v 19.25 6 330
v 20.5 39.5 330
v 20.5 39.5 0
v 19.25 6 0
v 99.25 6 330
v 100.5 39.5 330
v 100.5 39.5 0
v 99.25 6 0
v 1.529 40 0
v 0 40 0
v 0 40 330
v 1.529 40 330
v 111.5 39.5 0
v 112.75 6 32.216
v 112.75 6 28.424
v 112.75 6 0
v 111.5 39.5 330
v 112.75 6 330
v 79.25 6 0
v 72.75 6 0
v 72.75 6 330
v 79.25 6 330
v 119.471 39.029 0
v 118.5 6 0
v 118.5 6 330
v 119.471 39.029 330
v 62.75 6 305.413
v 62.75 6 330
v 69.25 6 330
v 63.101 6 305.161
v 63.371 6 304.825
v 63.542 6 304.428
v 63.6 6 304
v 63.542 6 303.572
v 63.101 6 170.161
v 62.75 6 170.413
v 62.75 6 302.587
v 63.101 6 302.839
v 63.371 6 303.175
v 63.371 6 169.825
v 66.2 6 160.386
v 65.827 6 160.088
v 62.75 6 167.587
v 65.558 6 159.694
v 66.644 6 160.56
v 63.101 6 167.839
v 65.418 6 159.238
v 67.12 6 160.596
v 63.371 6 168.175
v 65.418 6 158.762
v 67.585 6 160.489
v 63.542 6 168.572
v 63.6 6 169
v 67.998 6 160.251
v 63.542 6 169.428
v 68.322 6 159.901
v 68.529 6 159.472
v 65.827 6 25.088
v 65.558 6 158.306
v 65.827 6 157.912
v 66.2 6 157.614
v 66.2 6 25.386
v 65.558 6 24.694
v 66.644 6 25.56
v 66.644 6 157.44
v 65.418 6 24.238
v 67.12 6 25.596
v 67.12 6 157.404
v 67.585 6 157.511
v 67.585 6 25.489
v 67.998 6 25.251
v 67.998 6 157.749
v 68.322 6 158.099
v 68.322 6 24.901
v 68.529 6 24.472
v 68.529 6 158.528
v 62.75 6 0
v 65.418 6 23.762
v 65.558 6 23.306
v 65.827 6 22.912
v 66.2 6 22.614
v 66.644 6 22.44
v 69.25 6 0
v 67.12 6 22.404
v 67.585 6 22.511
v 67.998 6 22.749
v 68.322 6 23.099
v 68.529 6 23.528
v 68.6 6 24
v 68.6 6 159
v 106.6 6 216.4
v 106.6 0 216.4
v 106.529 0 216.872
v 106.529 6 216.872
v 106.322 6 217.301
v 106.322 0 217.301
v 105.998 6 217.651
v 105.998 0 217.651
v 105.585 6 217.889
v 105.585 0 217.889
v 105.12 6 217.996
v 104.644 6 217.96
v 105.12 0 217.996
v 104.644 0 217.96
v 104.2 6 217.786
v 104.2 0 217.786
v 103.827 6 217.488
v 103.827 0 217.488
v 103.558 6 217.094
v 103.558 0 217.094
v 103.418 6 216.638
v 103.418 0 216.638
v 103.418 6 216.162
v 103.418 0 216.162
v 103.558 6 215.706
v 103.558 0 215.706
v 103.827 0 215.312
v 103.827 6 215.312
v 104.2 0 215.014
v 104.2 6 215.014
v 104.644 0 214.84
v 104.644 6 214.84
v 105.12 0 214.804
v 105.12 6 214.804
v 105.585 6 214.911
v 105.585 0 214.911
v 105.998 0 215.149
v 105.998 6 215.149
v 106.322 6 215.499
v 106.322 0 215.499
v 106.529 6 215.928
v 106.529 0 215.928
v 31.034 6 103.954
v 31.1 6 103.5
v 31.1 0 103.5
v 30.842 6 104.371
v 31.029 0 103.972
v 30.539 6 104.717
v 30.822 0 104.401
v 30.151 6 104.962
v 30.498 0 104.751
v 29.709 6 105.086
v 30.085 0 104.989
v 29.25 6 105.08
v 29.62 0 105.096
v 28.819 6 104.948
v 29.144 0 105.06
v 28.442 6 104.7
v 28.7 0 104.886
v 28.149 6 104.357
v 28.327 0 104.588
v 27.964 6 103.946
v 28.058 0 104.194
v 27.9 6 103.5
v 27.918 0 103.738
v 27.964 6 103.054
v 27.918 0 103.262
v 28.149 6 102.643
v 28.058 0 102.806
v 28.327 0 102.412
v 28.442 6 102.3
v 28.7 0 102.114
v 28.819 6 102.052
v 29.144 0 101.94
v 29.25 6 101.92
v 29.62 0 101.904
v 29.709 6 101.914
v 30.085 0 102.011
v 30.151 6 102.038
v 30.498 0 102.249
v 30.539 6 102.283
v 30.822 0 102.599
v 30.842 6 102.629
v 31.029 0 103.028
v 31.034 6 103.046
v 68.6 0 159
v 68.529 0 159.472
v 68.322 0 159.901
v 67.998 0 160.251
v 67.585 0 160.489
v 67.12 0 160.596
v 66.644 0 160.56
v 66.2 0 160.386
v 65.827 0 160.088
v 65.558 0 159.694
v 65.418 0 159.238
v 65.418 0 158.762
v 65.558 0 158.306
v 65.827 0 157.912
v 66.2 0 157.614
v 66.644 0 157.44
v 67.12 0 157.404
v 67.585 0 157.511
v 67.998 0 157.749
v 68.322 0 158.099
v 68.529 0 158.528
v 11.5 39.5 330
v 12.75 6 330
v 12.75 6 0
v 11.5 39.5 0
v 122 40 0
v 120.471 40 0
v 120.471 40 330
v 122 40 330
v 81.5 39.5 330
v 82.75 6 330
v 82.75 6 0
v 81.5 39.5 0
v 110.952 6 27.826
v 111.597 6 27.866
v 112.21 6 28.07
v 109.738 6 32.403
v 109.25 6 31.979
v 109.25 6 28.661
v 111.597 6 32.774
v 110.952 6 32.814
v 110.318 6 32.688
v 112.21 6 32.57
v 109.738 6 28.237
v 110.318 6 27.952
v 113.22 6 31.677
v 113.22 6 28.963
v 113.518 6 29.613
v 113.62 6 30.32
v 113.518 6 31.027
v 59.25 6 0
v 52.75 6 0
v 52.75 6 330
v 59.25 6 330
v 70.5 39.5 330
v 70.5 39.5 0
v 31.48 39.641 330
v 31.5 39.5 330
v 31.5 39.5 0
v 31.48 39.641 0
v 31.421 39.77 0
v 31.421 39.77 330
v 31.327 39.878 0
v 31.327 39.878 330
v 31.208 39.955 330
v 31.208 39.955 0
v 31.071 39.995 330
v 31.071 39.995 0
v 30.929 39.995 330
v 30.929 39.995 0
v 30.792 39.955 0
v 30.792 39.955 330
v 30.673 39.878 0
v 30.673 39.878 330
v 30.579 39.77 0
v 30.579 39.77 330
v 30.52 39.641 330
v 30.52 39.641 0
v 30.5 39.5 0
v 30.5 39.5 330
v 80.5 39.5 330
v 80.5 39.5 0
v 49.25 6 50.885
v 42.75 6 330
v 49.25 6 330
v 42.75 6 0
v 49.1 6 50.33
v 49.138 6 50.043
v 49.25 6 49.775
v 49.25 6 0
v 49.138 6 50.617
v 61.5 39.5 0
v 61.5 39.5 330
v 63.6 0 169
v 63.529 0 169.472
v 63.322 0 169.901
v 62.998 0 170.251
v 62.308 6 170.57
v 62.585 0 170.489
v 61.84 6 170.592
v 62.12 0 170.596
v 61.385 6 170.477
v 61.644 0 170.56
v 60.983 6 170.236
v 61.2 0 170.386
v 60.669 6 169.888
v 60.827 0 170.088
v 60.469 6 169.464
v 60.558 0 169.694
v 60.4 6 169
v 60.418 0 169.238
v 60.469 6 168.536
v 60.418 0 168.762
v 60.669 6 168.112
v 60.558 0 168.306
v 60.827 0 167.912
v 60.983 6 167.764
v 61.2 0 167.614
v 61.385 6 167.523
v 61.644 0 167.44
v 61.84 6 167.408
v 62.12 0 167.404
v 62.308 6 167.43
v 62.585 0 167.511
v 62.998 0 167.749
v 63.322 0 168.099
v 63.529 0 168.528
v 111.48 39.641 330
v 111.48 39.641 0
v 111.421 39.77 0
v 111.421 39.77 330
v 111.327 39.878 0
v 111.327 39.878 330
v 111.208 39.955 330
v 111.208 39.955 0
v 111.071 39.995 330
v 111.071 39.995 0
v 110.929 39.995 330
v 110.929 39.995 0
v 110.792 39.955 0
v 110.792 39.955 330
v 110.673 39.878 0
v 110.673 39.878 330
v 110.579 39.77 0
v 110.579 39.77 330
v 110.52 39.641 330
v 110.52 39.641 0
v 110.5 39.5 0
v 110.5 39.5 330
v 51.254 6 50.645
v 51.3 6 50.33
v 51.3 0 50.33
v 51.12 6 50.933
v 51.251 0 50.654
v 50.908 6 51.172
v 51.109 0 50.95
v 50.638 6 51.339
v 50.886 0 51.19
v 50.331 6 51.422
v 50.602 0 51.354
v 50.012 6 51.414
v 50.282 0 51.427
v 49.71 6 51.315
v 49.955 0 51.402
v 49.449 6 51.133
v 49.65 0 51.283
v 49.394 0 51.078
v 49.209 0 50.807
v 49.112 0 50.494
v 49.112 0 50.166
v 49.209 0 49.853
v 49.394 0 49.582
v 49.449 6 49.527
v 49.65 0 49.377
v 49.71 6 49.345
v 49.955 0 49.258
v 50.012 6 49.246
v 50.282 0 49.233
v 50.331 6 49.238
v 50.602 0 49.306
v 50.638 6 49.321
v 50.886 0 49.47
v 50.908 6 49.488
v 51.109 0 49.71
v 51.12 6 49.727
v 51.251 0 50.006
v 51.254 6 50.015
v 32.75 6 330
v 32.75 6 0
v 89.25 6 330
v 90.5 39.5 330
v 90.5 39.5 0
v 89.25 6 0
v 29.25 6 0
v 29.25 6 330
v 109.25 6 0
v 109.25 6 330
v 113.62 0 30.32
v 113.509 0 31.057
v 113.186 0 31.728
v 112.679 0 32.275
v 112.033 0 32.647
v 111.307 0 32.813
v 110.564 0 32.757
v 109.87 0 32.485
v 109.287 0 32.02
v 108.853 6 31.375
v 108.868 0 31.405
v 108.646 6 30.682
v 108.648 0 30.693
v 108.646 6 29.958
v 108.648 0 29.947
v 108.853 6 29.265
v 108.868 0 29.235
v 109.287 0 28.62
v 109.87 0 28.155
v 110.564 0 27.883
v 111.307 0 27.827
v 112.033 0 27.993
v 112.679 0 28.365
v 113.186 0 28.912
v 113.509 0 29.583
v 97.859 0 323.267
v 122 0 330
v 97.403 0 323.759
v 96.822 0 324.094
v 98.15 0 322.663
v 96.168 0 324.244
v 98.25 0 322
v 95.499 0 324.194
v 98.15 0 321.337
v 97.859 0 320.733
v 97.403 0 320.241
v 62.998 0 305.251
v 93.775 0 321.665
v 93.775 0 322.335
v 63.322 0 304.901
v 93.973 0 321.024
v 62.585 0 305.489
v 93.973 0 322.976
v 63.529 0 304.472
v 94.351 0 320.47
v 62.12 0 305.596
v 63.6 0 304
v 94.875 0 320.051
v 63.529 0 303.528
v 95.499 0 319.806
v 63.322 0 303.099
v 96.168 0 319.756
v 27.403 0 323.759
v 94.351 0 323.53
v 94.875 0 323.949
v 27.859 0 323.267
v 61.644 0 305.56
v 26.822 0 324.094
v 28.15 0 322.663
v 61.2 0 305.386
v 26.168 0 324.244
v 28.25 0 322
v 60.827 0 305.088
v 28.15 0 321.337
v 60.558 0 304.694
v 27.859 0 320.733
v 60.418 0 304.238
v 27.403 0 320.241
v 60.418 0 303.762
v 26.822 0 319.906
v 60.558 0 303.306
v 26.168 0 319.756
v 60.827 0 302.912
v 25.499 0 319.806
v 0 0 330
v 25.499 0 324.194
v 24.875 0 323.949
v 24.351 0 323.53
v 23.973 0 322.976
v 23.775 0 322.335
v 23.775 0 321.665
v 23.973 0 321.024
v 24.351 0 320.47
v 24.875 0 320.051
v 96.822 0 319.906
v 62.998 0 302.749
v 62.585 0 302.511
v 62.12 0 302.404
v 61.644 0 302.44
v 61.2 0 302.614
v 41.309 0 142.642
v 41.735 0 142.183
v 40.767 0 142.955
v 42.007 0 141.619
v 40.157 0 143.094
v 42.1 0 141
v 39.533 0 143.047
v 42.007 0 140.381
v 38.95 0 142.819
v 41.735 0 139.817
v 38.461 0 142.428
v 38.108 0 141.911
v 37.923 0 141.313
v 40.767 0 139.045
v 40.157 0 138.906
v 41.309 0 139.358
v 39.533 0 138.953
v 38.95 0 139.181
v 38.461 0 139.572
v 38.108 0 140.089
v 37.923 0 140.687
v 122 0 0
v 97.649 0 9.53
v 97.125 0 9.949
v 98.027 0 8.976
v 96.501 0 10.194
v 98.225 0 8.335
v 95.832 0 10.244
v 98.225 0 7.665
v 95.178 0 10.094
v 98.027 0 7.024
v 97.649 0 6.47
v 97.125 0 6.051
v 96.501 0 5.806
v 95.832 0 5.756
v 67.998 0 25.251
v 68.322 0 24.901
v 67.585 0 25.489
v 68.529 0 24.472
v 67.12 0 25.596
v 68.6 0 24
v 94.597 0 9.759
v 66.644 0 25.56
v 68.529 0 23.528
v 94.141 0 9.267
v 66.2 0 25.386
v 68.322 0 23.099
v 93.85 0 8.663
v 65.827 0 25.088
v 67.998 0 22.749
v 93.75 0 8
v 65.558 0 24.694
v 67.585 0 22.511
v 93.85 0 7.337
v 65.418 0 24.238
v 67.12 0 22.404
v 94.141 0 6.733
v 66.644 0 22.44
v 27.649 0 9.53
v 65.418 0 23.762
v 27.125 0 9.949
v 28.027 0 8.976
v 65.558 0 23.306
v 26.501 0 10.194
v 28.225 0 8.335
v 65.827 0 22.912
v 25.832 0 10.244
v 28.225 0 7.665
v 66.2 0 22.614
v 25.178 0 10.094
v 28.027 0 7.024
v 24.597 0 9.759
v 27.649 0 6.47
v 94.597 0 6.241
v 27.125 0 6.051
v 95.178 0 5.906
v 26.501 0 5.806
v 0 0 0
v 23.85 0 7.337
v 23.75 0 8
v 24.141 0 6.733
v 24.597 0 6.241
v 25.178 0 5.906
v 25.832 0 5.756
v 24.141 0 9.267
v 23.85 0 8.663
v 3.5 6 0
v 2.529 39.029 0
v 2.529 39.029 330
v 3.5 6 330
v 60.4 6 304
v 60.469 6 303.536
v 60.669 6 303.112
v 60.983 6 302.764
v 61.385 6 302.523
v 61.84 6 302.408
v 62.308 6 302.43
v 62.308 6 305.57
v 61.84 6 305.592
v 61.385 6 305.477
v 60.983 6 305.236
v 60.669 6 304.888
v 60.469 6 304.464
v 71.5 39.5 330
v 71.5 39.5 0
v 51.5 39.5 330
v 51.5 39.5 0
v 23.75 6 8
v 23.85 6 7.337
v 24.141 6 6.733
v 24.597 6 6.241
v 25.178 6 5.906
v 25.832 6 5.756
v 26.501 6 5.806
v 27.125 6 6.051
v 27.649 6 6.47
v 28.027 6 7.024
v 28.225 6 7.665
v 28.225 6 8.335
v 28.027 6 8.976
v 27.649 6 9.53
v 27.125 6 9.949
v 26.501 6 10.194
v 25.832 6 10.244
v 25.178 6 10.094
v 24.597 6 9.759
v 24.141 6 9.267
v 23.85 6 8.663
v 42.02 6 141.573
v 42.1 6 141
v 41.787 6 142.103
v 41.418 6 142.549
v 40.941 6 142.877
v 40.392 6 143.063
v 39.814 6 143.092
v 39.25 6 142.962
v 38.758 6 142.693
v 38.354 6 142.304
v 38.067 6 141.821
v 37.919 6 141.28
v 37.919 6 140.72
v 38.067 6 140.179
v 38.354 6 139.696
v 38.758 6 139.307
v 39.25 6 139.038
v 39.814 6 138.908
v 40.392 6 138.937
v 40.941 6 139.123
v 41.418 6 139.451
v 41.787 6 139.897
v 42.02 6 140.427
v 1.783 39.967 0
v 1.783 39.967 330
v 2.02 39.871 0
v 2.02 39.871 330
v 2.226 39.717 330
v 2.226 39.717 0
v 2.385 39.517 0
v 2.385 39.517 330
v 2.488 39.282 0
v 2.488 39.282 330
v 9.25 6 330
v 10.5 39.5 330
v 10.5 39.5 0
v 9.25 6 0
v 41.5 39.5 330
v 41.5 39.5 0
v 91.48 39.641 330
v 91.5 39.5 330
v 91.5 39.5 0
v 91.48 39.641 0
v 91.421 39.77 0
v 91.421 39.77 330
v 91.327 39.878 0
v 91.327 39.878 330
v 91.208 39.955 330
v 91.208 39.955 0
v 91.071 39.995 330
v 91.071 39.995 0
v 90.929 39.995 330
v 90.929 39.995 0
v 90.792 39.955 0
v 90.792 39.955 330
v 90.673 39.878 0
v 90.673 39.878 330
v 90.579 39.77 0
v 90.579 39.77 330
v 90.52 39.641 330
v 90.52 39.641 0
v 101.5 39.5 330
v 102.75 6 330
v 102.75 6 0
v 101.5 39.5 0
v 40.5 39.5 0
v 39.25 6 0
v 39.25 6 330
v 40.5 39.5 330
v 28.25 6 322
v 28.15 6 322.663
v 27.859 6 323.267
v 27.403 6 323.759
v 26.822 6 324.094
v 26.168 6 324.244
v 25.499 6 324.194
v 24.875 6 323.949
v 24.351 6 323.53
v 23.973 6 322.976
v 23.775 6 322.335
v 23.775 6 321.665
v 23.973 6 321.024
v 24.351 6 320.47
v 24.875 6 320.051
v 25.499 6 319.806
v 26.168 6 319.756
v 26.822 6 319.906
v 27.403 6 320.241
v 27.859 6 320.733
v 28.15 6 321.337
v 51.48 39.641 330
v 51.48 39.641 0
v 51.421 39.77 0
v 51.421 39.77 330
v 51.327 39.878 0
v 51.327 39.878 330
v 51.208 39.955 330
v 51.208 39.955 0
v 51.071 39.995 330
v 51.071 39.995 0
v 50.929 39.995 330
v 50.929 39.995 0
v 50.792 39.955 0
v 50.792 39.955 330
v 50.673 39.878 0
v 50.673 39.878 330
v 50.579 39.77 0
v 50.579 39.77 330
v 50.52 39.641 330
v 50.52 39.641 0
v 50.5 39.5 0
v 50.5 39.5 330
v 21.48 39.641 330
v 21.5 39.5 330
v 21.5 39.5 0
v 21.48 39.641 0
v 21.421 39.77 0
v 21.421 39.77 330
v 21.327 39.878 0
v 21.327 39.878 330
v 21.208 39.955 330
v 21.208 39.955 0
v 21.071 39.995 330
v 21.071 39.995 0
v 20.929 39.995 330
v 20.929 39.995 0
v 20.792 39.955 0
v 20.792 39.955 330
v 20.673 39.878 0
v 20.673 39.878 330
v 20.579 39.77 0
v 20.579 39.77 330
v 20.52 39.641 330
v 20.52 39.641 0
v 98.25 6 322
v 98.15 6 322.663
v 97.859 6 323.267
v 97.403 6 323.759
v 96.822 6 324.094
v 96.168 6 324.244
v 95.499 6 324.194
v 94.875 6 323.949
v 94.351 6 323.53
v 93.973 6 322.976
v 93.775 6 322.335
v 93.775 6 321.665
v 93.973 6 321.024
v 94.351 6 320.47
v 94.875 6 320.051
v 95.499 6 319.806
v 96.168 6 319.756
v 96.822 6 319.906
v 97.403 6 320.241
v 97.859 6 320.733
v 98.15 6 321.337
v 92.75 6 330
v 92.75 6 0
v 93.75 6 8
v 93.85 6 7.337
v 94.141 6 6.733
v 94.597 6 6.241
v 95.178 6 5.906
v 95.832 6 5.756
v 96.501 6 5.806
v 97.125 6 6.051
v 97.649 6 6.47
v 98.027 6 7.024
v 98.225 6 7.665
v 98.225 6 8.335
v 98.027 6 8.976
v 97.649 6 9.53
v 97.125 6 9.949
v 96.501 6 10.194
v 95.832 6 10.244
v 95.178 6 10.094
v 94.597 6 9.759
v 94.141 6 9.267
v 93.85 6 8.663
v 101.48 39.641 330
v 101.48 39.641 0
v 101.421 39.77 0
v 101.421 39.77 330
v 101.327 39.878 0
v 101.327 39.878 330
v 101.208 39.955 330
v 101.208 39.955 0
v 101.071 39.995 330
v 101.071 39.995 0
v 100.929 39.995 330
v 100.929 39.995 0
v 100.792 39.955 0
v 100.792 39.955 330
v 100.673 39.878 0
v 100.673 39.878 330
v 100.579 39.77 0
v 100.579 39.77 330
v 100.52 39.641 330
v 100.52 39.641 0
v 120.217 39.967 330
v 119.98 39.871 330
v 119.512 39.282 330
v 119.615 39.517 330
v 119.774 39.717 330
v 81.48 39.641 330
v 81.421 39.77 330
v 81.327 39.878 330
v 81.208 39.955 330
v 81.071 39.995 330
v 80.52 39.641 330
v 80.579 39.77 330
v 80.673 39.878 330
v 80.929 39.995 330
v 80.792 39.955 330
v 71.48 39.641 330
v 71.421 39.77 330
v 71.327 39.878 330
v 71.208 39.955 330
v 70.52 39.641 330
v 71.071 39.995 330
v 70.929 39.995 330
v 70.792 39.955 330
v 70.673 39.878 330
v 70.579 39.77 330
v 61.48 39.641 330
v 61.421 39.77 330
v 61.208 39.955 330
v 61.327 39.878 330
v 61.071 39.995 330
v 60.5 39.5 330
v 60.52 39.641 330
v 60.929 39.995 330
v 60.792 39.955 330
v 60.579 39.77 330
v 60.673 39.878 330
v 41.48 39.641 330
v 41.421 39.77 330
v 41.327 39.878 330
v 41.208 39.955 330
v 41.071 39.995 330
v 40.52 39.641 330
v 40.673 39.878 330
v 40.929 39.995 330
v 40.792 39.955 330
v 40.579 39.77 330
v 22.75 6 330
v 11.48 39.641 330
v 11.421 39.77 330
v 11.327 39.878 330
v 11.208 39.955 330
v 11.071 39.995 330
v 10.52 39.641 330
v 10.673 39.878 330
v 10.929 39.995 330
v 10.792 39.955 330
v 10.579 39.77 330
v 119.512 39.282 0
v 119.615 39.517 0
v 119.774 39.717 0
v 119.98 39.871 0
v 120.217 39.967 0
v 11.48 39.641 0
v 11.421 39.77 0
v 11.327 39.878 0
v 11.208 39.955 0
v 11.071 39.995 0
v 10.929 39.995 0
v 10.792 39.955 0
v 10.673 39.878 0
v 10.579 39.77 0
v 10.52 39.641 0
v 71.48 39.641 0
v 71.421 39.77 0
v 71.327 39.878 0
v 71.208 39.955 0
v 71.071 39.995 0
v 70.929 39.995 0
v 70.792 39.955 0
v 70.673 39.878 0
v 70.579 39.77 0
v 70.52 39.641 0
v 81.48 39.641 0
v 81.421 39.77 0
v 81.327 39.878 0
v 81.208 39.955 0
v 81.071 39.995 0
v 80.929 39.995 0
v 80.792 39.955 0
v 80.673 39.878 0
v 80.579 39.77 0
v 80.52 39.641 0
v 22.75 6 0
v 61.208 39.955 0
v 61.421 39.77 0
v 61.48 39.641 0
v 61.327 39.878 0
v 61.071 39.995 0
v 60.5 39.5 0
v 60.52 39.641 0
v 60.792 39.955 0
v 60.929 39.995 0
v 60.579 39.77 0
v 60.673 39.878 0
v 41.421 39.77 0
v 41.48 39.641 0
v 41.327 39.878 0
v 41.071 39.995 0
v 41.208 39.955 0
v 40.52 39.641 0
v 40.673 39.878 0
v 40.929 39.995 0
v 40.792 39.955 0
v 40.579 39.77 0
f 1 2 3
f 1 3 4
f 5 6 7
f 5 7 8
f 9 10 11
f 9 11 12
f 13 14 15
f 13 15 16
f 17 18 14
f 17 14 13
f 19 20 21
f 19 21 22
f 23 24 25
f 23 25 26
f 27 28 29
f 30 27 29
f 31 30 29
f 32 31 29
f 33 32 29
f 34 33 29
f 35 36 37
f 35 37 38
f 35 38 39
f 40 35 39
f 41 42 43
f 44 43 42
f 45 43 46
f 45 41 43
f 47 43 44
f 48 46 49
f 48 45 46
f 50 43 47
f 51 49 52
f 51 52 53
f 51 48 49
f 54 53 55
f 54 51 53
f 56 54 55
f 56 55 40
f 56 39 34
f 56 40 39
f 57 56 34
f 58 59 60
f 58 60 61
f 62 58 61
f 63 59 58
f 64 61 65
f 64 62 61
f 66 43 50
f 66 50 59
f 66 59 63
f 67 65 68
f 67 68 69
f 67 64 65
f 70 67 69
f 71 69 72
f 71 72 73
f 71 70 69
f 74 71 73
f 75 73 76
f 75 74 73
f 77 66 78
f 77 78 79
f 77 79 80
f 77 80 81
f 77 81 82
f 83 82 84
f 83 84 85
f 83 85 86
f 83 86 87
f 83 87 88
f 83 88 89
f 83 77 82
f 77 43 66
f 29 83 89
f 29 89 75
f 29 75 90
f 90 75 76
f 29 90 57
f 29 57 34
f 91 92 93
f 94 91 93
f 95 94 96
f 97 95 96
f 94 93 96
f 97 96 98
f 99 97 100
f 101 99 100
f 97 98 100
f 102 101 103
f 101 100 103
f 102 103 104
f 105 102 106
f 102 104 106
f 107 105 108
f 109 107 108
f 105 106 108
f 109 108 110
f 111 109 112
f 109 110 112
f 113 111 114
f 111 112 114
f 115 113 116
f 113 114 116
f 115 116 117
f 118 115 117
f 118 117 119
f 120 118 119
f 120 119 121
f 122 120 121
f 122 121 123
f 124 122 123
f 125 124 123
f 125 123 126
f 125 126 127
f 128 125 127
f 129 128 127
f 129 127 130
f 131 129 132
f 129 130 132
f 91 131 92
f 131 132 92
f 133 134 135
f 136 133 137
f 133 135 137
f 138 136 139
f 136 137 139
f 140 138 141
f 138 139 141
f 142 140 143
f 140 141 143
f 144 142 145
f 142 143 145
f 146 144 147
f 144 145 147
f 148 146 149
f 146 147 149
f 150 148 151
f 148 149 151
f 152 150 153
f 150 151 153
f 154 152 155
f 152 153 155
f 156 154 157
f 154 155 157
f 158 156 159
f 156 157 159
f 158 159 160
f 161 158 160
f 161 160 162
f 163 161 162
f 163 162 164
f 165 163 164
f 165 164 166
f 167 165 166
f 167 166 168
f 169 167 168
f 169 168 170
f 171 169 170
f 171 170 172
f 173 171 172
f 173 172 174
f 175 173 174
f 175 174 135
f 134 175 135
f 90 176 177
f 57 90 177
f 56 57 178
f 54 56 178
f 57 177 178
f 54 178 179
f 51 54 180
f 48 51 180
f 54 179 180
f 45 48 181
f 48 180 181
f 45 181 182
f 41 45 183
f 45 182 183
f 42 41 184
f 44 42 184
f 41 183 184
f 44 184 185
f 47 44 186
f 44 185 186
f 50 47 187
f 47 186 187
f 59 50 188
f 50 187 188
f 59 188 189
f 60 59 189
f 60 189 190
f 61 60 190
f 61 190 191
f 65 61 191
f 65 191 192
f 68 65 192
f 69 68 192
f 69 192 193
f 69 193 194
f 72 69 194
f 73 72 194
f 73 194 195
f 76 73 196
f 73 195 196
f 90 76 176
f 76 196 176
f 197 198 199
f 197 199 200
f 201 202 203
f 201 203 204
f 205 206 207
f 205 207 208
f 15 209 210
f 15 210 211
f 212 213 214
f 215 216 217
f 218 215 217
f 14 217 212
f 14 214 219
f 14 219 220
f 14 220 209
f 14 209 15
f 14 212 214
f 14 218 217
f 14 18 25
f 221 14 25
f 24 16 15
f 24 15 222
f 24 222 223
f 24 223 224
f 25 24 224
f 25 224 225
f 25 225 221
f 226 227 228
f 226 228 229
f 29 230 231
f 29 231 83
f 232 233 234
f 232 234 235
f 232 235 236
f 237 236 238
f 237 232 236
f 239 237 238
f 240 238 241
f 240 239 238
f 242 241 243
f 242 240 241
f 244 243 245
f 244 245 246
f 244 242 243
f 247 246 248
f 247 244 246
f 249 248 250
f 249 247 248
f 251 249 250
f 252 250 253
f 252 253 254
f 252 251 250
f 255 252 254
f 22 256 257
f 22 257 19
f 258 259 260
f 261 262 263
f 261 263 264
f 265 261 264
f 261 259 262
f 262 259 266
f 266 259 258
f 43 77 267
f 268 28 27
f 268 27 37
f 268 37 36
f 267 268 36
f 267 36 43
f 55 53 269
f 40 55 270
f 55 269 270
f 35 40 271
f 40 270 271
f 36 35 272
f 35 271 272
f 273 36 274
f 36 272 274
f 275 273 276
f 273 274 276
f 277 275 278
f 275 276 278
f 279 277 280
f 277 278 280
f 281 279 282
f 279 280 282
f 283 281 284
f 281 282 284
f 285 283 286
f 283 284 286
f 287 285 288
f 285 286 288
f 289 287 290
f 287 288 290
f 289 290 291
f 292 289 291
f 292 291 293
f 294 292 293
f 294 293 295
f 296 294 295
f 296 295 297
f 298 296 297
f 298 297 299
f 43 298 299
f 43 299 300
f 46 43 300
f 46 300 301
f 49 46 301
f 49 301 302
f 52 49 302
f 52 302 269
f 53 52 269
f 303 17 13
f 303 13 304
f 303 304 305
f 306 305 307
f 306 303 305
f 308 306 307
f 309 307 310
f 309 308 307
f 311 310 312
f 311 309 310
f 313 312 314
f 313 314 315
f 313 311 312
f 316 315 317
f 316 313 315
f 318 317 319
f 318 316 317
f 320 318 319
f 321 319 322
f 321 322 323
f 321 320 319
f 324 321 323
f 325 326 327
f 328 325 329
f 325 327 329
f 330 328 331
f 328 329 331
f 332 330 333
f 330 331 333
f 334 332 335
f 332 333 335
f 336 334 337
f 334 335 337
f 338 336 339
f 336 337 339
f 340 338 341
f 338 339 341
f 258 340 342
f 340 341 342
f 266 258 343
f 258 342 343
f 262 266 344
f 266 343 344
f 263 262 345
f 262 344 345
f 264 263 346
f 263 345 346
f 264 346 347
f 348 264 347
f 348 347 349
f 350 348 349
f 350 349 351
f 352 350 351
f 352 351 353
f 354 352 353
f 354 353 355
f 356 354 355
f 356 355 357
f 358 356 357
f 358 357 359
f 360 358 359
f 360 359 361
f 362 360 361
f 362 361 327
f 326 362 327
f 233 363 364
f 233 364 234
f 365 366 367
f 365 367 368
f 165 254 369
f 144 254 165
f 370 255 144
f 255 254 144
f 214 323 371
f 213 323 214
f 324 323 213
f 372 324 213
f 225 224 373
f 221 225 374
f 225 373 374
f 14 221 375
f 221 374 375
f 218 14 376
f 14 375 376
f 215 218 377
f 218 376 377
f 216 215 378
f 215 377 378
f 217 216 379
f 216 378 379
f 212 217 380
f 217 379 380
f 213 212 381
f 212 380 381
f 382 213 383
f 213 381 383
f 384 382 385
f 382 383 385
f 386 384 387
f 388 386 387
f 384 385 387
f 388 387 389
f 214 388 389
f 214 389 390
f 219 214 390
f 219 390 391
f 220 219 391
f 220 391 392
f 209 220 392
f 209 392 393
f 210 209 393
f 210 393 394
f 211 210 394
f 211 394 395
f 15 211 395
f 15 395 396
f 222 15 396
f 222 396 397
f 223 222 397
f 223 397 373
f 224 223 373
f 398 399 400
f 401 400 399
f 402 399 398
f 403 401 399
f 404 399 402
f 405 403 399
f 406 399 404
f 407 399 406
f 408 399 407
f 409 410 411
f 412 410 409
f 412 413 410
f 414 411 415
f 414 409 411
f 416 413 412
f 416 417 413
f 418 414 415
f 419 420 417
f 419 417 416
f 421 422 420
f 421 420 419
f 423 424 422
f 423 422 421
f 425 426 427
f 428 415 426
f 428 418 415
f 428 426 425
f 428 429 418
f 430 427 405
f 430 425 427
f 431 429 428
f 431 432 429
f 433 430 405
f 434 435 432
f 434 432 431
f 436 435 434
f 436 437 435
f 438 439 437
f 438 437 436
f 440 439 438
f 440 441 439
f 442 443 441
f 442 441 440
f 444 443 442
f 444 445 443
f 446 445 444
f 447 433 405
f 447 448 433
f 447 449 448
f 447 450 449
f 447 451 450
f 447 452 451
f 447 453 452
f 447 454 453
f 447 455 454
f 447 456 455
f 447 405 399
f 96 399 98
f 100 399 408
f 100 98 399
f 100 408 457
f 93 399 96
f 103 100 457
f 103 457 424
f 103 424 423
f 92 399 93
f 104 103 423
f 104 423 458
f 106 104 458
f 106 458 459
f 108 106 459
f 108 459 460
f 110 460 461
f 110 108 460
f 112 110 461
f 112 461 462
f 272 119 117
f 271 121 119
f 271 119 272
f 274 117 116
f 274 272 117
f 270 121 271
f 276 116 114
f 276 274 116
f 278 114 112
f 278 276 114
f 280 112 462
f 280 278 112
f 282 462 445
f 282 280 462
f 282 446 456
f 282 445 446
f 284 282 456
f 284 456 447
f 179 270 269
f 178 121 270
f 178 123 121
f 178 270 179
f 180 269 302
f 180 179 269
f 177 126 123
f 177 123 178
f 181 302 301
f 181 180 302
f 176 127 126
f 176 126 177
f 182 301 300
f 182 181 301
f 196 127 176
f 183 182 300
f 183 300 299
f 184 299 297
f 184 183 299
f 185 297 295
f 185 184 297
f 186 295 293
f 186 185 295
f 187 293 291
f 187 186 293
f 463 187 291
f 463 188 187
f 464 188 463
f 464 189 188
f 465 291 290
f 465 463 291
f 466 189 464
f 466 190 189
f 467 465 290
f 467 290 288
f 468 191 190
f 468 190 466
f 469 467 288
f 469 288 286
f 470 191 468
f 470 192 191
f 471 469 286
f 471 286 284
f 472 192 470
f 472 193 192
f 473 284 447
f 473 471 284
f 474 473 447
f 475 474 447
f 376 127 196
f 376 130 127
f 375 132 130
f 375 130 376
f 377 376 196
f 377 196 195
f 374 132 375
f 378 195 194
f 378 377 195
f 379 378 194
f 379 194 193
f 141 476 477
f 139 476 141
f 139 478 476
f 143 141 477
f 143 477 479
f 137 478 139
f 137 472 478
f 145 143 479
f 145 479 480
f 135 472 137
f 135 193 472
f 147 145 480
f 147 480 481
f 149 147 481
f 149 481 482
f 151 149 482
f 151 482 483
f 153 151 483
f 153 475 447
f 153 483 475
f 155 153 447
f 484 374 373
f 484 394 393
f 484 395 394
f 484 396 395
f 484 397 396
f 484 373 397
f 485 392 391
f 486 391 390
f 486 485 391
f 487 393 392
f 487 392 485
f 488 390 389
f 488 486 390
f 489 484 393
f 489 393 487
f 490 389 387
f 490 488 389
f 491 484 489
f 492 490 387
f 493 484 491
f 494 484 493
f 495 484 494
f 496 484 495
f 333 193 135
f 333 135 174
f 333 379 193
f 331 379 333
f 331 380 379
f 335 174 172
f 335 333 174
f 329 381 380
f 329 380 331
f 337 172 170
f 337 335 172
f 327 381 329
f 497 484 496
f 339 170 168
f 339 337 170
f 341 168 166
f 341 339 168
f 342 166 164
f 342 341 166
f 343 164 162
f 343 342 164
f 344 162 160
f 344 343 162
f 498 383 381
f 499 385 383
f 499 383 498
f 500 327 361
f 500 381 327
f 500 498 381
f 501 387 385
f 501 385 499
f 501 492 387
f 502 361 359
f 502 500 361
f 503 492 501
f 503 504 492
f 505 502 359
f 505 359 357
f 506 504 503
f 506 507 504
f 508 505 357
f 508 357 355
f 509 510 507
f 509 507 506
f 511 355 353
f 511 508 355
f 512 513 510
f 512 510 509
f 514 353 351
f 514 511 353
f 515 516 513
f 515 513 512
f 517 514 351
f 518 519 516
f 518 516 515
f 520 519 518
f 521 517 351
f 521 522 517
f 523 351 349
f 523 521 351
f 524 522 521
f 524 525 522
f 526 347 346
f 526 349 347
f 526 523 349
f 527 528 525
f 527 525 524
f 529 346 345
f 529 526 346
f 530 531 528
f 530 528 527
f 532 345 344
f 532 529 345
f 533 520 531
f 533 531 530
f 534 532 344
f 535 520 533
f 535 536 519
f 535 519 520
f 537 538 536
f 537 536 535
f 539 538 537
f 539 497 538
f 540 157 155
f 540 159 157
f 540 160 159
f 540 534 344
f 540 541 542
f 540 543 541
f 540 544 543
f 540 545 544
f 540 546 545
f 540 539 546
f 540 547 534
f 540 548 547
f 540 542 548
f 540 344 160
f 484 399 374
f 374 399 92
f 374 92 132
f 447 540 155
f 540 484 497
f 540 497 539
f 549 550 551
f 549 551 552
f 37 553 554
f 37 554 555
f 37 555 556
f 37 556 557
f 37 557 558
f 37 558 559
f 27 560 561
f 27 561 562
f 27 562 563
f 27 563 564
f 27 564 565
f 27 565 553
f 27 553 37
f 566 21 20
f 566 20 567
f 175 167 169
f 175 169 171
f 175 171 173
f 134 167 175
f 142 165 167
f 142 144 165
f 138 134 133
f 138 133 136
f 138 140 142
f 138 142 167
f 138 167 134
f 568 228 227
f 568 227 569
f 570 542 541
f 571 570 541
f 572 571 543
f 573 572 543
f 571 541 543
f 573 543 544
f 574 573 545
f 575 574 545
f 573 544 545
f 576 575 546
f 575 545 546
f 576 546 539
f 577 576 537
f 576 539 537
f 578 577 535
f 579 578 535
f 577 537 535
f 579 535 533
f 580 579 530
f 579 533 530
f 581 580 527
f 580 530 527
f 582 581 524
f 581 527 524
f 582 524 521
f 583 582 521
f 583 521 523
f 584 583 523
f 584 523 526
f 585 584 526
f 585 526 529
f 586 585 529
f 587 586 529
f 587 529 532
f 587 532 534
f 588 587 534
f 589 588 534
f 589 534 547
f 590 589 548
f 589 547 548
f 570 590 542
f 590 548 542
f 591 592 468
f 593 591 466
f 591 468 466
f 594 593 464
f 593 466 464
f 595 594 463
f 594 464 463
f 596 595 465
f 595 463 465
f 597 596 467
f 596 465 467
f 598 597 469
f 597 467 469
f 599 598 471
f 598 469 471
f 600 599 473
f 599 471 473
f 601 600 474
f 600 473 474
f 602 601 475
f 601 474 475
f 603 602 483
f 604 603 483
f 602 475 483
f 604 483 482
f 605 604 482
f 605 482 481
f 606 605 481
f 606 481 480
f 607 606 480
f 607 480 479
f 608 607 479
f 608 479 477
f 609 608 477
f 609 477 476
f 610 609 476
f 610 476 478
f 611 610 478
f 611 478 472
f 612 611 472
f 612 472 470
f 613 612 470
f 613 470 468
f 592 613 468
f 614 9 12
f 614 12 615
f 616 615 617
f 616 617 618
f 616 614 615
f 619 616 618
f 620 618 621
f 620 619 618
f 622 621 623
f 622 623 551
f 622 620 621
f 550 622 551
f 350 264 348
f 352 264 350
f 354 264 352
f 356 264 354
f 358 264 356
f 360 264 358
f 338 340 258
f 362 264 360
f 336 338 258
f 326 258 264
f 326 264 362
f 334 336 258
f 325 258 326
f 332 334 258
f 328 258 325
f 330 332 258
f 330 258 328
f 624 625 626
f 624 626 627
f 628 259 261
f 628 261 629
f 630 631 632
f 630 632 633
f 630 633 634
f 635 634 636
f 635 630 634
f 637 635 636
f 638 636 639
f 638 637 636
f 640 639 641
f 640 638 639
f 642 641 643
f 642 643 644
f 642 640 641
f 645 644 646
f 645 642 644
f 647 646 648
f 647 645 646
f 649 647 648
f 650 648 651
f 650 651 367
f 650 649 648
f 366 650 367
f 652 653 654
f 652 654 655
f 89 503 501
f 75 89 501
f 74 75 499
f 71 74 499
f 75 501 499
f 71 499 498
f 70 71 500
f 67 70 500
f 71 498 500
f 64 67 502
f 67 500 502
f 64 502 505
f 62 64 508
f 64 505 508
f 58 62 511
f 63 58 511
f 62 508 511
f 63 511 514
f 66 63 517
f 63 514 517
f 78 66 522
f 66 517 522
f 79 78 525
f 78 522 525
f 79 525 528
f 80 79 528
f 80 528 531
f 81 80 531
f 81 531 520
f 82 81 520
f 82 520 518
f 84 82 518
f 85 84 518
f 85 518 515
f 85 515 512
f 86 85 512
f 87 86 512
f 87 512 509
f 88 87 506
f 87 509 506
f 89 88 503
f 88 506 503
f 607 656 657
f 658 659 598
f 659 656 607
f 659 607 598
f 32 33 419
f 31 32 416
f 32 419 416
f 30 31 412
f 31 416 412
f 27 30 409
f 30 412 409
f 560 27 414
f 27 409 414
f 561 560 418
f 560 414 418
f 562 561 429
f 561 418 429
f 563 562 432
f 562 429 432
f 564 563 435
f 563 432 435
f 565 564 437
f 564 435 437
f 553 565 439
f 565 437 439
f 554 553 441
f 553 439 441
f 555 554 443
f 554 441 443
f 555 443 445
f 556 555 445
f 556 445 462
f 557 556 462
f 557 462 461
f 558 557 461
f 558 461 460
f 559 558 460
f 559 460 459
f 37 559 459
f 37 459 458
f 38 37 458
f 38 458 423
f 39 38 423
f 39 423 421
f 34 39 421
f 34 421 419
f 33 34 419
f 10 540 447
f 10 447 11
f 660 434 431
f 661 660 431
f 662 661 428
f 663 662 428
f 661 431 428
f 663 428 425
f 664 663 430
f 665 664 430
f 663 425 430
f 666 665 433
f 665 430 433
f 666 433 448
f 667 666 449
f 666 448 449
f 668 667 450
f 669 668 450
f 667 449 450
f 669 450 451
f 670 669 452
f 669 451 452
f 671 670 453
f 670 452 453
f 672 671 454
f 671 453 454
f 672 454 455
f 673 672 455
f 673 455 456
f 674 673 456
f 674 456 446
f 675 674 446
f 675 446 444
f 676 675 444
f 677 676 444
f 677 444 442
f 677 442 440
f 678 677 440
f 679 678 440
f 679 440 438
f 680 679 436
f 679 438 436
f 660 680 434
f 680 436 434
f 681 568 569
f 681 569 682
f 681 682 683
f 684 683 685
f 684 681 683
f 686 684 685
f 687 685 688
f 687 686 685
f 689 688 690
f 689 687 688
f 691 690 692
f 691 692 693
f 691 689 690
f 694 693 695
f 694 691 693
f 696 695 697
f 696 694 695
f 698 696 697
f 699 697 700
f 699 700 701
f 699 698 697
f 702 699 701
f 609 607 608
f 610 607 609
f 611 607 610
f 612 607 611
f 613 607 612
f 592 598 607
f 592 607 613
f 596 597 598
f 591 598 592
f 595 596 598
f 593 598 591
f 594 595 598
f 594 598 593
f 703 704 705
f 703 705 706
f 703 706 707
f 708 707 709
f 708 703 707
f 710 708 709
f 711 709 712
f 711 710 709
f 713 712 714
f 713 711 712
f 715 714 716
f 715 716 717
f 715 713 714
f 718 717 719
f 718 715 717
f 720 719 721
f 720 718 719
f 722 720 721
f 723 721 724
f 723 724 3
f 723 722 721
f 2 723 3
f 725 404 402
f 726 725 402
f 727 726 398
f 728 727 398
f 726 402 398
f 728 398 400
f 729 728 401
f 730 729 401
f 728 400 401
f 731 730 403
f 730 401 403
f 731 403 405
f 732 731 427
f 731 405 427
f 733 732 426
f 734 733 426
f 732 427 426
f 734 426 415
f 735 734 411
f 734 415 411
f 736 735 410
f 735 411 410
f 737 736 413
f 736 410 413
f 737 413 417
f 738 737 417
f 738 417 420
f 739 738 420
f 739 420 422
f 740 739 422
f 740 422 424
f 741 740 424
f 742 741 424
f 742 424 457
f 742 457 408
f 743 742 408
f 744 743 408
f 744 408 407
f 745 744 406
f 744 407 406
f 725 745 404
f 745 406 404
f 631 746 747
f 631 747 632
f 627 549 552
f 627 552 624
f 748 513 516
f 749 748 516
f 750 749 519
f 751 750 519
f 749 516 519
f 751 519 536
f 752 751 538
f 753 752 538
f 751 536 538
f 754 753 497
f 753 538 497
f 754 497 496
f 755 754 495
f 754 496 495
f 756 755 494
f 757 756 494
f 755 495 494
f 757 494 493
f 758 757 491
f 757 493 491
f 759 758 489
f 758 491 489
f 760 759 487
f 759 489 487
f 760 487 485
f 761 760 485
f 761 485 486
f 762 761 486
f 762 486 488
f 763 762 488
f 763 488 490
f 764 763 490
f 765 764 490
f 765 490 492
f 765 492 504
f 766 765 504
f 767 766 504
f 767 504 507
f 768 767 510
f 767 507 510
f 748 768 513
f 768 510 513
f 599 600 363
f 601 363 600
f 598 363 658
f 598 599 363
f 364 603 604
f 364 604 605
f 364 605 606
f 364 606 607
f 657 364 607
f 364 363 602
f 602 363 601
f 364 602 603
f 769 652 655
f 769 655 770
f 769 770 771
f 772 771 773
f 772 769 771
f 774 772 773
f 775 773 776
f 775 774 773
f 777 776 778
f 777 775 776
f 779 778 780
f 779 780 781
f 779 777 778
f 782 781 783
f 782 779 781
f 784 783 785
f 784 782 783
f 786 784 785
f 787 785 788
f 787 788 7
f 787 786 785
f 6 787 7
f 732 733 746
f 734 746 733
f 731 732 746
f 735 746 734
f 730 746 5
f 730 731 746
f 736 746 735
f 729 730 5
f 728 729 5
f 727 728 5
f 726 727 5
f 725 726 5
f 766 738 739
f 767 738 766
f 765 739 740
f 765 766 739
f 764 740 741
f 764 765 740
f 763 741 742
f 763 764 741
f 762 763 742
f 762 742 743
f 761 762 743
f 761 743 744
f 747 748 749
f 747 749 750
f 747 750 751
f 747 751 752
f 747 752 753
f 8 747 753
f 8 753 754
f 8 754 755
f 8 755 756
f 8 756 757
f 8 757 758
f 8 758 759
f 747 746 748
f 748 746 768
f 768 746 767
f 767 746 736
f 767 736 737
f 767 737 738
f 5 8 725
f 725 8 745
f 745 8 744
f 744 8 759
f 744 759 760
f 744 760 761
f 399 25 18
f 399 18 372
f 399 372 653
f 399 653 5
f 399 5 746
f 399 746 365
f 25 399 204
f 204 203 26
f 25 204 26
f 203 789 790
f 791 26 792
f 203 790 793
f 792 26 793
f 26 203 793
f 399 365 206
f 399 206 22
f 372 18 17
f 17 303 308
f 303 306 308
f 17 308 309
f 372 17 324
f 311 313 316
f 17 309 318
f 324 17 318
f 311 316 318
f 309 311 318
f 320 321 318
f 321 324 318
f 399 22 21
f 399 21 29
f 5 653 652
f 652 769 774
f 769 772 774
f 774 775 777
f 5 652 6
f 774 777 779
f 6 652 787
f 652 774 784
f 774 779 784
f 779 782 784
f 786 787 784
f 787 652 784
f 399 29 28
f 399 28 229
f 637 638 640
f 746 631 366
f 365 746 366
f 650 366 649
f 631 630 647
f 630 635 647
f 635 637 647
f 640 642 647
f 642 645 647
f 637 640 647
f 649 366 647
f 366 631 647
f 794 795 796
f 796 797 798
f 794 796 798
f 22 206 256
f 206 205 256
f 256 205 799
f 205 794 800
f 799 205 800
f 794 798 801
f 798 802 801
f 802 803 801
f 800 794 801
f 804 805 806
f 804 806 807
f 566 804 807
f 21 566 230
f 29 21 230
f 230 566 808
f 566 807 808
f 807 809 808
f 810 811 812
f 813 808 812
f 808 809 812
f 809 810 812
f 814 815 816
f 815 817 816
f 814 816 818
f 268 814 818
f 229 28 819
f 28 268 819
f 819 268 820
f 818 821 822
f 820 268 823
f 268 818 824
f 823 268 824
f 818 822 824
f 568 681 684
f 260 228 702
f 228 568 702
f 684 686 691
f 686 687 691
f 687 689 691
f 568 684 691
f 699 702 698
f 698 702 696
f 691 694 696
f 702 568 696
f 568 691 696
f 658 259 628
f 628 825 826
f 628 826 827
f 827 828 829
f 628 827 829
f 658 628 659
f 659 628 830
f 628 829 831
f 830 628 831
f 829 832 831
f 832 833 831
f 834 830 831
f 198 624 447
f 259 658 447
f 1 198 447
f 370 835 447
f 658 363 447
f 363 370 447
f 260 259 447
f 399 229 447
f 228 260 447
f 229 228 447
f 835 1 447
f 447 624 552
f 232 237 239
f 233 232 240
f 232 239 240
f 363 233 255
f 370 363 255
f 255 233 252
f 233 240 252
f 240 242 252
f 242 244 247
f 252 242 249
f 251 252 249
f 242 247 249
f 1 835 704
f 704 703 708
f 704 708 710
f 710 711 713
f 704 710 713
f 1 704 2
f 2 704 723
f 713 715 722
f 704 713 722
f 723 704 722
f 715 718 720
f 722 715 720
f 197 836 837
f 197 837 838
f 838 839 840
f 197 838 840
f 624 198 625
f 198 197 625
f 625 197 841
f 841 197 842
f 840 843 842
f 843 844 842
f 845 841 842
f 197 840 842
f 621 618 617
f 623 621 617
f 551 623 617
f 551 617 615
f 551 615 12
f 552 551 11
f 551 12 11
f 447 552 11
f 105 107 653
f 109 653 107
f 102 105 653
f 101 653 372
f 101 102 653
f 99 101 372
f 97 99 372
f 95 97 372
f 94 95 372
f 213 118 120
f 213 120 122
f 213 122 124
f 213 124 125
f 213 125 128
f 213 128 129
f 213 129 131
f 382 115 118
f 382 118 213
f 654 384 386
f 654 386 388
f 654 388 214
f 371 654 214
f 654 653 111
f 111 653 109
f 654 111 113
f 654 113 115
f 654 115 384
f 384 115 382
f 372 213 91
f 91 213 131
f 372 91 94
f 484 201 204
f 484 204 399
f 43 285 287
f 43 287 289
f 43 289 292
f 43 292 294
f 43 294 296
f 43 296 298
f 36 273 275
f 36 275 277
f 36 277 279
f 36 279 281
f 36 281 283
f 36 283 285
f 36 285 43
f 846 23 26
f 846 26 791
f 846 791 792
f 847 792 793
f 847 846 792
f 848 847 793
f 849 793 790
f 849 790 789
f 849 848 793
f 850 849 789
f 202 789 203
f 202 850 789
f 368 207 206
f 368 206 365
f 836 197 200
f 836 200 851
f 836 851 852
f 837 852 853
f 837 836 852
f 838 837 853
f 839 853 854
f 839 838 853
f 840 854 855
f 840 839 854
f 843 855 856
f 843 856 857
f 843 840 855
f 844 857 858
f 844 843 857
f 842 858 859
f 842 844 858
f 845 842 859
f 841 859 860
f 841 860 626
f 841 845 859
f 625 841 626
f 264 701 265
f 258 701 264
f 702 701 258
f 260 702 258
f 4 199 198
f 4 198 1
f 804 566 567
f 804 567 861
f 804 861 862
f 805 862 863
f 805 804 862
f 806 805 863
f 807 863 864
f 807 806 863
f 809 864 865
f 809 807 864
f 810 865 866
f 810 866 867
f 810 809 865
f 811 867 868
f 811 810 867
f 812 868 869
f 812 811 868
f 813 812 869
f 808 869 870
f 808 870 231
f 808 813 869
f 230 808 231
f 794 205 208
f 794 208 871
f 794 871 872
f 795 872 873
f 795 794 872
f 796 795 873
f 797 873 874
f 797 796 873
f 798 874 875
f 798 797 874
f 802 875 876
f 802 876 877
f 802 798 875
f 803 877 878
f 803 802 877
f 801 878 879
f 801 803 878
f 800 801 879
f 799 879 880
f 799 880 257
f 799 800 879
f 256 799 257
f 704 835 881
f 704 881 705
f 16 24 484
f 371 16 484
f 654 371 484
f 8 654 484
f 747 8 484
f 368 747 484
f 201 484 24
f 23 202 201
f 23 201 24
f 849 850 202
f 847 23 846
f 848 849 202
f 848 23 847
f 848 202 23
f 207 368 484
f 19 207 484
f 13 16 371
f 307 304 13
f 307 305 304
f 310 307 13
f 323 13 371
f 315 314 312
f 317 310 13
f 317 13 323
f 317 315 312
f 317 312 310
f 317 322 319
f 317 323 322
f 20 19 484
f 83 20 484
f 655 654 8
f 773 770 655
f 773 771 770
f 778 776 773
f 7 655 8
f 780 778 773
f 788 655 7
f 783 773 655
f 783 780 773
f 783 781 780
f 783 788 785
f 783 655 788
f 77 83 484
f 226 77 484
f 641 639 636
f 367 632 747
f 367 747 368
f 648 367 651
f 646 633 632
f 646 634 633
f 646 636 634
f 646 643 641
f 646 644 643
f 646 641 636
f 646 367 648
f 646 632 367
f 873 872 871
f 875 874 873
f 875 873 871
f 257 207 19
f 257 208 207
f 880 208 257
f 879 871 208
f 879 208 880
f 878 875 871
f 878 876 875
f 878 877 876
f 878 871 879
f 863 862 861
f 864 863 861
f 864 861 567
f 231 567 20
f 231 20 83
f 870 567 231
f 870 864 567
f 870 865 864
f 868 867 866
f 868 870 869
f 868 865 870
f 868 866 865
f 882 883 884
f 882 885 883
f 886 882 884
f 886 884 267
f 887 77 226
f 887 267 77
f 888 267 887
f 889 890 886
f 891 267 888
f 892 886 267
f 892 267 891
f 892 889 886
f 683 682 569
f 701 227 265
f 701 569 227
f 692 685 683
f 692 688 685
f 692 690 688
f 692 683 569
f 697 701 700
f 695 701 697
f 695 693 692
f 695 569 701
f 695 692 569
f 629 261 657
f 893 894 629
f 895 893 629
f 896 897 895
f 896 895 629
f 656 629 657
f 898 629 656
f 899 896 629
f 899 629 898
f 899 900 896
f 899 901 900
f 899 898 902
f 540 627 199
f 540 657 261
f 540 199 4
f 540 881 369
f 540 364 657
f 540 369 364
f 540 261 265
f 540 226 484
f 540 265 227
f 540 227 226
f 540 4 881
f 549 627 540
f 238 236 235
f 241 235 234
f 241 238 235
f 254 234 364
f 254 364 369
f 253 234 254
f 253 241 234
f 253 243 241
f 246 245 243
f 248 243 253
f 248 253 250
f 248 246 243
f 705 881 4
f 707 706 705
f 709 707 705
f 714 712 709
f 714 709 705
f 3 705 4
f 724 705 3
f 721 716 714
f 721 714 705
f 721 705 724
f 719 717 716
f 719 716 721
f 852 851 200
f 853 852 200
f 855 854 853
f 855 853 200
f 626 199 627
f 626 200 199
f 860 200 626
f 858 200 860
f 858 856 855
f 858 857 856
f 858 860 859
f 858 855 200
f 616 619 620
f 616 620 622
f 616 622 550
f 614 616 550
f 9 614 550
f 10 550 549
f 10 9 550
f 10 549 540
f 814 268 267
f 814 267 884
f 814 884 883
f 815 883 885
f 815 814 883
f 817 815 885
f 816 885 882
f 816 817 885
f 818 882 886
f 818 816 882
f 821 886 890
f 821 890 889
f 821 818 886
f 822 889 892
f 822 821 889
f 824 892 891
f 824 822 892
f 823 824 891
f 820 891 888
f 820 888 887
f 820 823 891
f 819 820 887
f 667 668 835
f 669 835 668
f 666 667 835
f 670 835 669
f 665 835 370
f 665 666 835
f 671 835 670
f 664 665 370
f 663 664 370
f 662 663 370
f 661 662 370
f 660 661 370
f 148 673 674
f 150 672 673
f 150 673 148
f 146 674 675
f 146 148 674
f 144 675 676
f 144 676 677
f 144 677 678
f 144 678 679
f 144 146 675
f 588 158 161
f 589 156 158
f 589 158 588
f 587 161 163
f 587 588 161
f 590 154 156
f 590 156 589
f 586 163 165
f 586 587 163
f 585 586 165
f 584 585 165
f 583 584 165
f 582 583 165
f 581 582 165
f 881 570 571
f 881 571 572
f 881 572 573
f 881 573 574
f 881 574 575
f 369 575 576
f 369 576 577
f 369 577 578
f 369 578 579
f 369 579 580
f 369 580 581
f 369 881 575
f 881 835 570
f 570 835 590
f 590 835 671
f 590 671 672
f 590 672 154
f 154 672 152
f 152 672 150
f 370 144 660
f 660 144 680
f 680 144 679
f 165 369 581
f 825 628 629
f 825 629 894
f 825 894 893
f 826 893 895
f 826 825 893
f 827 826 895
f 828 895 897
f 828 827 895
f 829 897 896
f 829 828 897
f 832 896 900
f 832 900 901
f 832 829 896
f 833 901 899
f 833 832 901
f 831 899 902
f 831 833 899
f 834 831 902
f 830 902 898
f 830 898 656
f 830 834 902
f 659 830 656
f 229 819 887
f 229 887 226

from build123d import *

# Parameters (mm, degrees)
EXTRUDE_1_DEPTH       = 330
EXTRUDE_3_DEPTH       = 330
PATTERN_CURVE_1_COUNT = 11
PATTERN_CURVE_1_PITCH = 10
SKETCH_3_R            = 2.25
CUT_EXTRUDE_1_DEPTH   = 6
SKETCH_4_R            = 1.6
SKETCH_4_R_2          = 2.1
SKETCH_4_R_3          = 2.5
SKETCH_4_R_4          = 1.1
CUT_EXTRUDE_2_DEPTH   = 6


with BuildPart() as part:
    # Эскиз1 → Вытянуть1 (new body)
    with BuildSketch(Plane.XY):
        with BuildLine():
            Line((0, 40), (1.528979332, 40))
            ThreePointArc((1.528979332, 40), (2.225614441, 39.717425624), (2.528547087, 39.029399052))
            Line((2.528547087, 39.029399052), (3.5, 6))
            Line((3.5, 6), (118.5, 6))
            Line((118.5, 6), (119.471452913, 39.029399052))
            ThreePointArc((119.471452913, 39.029399052), (119.774385559, 39.717425624), (120.471020668, 40))
            Line((120.471020668, 40), (122, 40))
            Line((122, 40), (122, 0))
            Line((122, 0), (0, 0))
            Line((0, 0), (0, 40))
        make_face()
    extrude(amount=EXTRUDE_1_DEPTH)

    # Эскиз2 → Вытянуть3 (add)
    with BuildSketch(Plane.XY.offset(330)):
        with BuildLine():
            Line((10.5, 39.5), (9.25, 6))
            Line((9.25, 6), (12.75, 6))
            Line((12.75, 6), (11.5, 39.5))
            ThreePointArc((11.5, 39.5), (11, 40), (10.5, 39.5))
        make_face()
    extrude_3 = extrude(amount=-EXTRUDE_3_DEPTH)

    # Кривая1: Вытянуть3 ×11
    with Locations(*[(i * PATTERN_CURVE_1_PITCH, 0, 0) for i in range(1, PATTERN_CURVE_1_COUNT)]):
        add(extrude_3)

    # Эскиз3 → Вырез-Вытянуть1 (cut)
    with BuildSketch(Plane.XZ):
        with Locations((26, 322)):
            Circle(SKETCH_3_R)
        with Locations((96, 322)):
            Circle(SKETCH_3_R)
        with Locations(Location((96, 8, 0), (0, 0, 180))):
            Circle(SKETCH_3_R)
        with Locations(Location((26, 8, 0), (0, 0, 180))):
            Circle(SKETCH_3_R)
    extrude(amount=-CUT_EXTRUDE_1_DEPTH, mode=Mode.SUBTRACT)

    # Эскиз4 → Вырез-Вытянуть2 (cut)
    with BuildSketch(Plane(origin=(1.487985642, 0, 27.400529356), x_dir=(1, 0, 0), z_dir=(0, -1, 0))):
        with Locations((65.512014358, 131.599470644)):
            Circle(SKETCH_4_R)
        with Locations((103.512014358, 188.999470644)):
            Circle(SKETCH_4_R)
        with Locations((60.512014358, 276.599470644)):
            Circle(SKETCH_4_R)
        with Locations((60.512014358, 141.599470644)):
            Circle(SKETCH_4_R)
        with Locations((65.512014358, -3.400529356)):
            Circle(SKETCH_4_R)
        with Locations((38.512014358, 113.599470644)):
            Circle(SKETCH_4_R_2)
        with Locations((109.632014358, 2.919470644)):
            Circle(SKETCH_4_R_3)
        with Locations((28.012014358, 76.099470644)):
            Circle(SKETCH_4_R)
        with Locations((48.712014358, 22.929470644)):
            Circle(SKETCH_4_R_4)
    extrude(amount=-CUT_EXTRUDE_2_DEPTH, mode=Mode.SUBTRACT)


solid = part.part
